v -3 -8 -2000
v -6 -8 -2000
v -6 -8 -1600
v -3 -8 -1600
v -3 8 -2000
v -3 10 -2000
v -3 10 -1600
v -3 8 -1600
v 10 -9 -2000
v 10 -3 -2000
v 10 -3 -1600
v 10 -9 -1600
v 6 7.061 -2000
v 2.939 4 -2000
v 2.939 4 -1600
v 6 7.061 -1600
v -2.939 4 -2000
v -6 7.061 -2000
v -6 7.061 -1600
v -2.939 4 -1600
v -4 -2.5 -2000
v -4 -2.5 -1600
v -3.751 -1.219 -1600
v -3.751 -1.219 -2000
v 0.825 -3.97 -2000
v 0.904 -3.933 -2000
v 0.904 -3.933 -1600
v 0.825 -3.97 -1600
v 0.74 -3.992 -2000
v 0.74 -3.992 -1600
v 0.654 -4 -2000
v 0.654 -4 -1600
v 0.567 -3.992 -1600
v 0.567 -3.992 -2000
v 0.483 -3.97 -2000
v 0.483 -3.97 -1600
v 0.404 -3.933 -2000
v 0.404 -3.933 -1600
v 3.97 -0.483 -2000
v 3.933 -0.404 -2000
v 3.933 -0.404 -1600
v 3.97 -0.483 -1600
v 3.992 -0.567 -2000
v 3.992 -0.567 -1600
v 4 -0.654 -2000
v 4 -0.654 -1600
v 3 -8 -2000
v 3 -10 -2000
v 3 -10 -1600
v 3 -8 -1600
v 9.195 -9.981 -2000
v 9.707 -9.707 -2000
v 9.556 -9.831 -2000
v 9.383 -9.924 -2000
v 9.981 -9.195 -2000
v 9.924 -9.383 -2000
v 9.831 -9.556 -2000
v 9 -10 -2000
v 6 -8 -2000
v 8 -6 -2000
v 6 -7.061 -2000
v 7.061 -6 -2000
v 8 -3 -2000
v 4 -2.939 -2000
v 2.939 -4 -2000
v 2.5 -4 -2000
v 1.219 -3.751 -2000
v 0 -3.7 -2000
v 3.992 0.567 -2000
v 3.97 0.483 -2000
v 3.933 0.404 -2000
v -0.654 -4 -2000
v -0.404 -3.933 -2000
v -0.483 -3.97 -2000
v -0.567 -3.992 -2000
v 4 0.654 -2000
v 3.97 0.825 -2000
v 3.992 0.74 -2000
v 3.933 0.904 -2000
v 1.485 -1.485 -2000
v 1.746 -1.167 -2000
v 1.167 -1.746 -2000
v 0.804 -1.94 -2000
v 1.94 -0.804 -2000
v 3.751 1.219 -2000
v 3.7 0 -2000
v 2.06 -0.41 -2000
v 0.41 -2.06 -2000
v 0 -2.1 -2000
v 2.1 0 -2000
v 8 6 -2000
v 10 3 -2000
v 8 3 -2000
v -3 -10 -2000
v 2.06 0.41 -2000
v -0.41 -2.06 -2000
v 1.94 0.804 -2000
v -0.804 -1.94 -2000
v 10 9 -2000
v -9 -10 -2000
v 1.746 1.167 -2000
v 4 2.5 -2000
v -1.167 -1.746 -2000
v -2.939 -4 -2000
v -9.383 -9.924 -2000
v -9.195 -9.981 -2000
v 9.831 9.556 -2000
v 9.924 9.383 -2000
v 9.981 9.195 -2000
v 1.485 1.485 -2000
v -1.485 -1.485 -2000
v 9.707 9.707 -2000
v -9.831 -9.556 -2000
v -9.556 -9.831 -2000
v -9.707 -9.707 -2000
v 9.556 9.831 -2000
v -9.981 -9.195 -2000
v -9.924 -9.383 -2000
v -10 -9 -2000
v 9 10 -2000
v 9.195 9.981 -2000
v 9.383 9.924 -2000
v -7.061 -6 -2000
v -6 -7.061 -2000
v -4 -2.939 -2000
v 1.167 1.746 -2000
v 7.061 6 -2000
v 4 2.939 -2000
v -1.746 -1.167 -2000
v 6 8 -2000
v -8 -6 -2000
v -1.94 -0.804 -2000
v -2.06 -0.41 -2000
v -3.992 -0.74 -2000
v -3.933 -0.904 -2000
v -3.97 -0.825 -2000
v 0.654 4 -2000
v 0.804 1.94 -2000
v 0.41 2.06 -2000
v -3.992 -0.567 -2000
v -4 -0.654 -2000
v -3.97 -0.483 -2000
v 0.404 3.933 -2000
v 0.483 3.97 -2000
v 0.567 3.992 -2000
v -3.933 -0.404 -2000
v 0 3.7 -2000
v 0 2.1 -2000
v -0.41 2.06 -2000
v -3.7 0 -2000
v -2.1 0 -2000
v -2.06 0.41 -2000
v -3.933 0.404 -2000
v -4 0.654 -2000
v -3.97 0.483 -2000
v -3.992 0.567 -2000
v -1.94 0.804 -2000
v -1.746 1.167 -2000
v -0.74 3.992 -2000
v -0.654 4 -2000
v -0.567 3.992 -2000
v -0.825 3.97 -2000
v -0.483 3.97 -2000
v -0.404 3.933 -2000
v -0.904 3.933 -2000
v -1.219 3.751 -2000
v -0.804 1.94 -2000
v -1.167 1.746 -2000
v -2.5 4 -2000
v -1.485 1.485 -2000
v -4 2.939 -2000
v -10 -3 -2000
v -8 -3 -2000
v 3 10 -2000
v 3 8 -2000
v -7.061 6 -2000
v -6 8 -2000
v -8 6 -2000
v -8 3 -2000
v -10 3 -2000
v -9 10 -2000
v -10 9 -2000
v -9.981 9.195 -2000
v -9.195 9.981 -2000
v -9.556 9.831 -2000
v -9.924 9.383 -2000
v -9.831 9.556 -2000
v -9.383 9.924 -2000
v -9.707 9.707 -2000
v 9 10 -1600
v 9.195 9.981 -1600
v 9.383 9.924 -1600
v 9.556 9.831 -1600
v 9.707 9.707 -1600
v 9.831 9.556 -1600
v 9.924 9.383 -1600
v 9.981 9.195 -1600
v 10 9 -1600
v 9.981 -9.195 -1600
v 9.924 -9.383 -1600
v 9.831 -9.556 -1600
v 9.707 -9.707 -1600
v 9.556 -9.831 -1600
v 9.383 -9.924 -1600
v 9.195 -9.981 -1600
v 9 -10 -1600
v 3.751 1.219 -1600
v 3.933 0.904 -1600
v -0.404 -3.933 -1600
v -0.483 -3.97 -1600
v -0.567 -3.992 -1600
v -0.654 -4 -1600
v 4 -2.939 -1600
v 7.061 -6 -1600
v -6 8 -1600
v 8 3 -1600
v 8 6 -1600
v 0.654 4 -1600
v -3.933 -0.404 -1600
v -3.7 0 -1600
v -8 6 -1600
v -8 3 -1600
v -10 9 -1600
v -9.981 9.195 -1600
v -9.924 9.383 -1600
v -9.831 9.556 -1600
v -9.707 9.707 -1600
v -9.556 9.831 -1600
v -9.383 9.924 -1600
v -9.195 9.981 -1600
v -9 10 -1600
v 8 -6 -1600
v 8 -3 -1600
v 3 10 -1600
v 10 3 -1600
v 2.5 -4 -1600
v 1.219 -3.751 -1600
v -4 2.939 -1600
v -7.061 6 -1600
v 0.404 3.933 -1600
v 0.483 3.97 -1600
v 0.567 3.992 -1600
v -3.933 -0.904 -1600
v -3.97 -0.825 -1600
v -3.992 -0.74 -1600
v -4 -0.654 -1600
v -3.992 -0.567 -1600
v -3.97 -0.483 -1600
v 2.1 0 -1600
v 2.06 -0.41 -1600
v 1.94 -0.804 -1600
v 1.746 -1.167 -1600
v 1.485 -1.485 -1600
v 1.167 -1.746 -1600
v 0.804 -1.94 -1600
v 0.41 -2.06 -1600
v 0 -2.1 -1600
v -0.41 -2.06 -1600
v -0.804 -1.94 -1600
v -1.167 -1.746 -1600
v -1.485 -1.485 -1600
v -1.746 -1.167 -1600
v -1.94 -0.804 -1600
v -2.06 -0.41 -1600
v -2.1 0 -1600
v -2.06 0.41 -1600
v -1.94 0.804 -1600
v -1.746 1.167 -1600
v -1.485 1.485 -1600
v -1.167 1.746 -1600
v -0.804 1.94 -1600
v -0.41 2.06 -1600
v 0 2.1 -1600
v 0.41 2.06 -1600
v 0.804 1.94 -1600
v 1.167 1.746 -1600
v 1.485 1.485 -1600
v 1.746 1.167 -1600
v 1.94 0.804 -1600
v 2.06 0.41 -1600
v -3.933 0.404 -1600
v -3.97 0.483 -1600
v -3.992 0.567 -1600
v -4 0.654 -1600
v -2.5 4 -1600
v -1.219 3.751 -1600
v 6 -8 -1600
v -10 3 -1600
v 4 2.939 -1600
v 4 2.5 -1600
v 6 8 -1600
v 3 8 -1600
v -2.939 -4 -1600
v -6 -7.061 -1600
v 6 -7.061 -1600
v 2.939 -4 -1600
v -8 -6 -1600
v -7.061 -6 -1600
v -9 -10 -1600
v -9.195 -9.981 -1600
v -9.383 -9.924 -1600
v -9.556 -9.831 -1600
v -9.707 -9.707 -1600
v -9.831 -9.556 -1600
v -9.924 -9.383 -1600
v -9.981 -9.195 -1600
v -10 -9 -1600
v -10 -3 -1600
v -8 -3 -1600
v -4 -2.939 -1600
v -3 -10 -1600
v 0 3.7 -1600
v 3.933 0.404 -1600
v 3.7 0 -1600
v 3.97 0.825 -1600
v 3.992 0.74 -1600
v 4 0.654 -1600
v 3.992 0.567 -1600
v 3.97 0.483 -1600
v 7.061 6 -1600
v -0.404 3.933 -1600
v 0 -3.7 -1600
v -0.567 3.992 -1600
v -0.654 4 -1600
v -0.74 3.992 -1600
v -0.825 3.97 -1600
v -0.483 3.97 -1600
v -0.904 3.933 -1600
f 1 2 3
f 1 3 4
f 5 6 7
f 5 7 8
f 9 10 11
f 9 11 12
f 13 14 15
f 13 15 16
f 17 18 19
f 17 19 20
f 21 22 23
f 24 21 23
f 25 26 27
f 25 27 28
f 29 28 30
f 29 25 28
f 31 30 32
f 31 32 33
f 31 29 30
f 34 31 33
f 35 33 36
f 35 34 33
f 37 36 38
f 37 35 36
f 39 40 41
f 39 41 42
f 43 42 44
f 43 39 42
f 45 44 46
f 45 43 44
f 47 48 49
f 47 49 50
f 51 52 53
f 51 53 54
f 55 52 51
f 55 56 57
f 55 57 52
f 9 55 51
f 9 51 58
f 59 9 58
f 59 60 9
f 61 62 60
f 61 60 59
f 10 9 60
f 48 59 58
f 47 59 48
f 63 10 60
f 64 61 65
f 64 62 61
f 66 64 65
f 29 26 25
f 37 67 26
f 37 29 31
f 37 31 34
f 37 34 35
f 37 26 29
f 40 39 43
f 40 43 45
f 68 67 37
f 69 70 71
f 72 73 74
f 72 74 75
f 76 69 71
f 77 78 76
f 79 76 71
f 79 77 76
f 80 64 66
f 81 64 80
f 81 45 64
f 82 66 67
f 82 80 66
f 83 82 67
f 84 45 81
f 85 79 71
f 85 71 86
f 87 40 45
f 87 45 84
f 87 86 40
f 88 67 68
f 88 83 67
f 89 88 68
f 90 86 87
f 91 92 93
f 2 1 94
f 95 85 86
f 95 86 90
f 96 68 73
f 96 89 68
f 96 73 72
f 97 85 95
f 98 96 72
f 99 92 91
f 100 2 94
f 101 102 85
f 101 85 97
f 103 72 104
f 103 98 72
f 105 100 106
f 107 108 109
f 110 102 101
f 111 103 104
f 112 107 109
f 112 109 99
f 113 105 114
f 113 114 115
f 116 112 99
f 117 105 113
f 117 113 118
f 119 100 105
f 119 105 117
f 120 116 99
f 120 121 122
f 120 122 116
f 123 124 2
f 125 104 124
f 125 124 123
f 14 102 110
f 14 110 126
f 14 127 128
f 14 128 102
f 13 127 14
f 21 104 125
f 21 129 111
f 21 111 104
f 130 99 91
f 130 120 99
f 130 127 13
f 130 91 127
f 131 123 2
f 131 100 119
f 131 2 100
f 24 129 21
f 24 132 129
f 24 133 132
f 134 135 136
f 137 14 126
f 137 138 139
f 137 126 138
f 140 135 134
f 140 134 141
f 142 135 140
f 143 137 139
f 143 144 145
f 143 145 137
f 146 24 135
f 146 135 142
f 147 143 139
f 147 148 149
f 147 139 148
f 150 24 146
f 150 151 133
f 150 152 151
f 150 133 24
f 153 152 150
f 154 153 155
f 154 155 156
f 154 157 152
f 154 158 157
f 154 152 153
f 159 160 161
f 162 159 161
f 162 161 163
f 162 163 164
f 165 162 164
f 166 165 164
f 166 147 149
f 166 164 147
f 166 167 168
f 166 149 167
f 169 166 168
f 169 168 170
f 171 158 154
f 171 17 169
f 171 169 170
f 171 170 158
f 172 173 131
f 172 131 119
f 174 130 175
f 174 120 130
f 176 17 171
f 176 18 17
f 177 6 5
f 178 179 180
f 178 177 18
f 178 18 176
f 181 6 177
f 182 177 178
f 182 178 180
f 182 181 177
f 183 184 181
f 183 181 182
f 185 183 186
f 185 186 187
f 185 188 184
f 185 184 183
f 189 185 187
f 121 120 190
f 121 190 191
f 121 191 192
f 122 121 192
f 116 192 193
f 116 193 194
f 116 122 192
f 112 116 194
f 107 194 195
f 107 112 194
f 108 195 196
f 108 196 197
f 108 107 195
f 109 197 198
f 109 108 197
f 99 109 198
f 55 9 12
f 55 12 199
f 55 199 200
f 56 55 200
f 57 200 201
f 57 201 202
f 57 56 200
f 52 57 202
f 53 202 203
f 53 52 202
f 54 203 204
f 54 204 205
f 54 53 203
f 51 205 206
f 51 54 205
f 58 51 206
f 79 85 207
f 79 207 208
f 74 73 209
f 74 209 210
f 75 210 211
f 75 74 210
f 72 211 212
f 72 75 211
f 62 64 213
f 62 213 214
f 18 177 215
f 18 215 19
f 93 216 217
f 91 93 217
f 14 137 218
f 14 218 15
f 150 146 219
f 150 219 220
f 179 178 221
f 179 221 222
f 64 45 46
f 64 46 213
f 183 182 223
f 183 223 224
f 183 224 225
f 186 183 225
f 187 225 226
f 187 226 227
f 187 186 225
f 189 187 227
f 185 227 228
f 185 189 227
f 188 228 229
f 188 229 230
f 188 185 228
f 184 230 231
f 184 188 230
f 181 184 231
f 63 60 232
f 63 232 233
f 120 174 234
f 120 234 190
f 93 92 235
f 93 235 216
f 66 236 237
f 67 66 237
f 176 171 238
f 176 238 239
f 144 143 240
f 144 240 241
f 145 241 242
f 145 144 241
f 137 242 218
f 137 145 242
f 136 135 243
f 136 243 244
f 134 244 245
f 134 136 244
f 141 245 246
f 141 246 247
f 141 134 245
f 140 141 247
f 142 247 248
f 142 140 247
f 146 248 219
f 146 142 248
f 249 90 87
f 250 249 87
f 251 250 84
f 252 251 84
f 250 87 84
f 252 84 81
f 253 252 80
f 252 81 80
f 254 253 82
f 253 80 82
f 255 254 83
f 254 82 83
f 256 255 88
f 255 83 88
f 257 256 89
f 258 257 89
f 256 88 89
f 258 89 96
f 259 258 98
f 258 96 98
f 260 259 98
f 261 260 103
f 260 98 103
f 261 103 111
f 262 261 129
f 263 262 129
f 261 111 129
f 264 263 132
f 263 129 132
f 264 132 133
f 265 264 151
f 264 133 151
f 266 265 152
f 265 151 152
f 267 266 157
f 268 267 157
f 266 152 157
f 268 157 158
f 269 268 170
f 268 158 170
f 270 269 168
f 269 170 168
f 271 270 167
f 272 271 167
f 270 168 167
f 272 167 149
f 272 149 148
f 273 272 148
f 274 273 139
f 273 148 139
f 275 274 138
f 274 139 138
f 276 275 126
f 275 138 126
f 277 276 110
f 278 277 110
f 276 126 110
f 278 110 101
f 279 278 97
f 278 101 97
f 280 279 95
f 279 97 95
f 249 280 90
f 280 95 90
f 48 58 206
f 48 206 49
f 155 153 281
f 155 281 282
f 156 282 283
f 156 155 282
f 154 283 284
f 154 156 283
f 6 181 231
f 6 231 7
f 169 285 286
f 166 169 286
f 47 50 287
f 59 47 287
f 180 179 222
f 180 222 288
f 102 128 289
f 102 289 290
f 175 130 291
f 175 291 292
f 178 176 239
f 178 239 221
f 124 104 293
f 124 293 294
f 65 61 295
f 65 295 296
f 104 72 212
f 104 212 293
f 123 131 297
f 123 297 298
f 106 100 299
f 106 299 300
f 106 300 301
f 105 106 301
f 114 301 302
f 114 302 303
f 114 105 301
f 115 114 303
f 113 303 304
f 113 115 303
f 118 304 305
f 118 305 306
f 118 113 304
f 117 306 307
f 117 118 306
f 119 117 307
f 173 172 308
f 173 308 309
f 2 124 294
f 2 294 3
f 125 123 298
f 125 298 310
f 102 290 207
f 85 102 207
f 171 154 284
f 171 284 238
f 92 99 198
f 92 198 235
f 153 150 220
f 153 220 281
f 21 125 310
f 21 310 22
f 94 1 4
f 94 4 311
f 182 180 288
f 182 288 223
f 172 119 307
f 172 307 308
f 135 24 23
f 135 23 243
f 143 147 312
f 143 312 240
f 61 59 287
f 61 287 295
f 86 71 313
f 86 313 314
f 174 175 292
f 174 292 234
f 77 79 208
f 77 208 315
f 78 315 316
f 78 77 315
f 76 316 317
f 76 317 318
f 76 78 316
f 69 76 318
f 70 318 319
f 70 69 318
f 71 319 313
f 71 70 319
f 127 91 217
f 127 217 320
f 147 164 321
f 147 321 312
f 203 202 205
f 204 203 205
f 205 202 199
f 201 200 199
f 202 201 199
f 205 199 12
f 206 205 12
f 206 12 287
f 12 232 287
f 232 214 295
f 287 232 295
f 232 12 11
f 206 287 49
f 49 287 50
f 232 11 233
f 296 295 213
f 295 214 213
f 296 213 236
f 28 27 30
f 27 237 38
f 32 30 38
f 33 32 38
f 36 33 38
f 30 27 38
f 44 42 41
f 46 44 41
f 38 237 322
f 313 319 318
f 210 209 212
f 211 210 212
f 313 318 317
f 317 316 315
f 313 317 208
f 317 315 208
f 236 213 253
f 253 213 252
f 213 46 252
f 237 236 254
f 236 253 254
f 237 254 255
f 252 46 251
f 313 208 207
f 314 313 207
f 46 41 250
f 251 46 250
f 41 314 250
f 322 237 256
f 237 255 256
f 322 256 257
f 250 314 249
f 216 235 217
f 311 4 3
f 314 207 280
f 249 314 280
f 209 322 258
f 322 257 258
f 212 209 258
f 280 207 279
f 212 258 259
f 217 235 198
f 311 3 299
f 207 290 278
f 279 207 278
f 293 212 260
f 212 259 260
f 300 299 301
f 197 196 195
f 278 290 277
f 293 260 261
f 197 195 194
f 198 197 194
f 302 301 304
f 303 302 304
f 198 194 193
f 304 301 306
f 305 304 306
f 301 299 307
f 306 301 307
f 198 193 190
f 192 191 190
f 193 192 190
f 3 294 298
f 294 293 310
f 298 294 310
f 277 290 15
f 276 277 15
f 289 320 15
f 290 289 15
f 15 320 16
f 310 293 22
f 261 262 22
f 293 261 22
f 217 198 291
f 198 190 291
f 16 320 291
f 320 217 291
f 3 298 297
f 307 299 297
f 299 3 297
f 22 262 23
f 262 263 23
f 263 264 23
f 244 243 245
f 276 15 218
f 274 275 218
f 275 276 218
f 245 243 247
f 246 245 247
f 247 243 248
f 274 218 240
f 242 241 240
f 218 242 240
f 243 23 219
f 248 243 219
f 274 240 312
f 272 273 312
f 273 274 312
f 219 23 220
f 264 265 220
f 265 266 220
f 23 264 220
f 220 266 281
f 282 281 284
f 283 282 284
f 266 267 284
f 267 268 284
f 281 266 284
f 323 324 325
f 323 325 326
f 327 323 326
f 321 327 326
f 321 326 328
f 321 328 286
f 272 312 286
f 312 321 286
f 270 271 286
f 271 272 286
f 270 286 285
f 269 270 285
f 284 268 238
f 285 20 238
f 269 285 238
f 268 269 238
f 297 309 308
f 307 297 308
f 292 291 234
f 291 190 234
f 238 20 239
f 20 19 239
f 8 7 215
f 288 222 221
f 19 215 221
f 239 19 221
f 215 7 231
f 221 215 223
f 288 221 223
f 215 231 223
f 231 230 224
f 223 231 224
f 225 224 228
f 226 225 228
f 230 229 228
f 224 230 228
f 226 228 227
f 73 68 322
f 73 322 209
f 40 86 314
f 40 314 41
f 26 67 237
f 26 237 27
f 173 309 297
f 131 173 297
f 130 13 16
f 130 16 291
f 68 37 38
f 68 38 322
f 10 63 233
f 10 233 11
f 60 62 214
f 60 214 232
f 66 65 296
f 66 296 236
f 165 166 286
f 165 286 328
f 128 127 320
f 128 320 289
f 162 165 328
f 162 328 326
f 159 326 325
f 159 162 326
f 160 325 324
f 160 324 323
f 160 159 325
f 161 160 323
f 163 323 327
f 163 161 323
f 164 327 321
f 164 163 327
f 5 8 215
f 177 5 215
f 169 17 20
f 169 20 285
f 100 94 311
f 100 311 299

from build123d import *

# Parameters (mm, degrees)
SKETCH1_R           = 2.1
BOSS_EXTRUDE1_DEPTH = 400


with BuildPart() as part:
    # Sketch1 → Boss-Extrude1 (new body)
    with BuildSketch(Plane(origin=(0, 0, -2000), x_dir=(-1, 0, 0), z_dir=(0, 0, -1))):
        with BuildLine():
            Line((10, -3), (8, -3))
            Line((8, -3), (8, -6))
            Line((8, -6), (7.060660172, -6))
            Line((7.060660172, -6), (4, -2.939339828))
            Line((4, -2.939339828), (4, -2.5))
            Line((4, -2.5), (3.750976592, -1.218885629))
            Line((3.750976592, -1.218885629), (3.933012702, -0.903589838))
            ThreePointArc((3.933012702, -0.903589838), (4, -0.653589838), (3.933012702, -0.403589838))
            Line((3.933012702, -0.403589838), (3.7, 0))
            Line((3.7, 0), (3.933012702, 0.403589838))
            ThreePointArc((3.933012702, 0.403589838), (3.982962913, 0.524180316), (4, 0.653589838))
            Line((4, 0.653589838), (4, 2.939339828))
            Line((4, 2.939339828), (7.060660172, 6))
            Line((7.060660172, 6), (8, 6))
            Line((8, 6), (8, 3))
            Line((8, 3), (10, 3))
            Line((10, 3), (10, 9))
            ThreePointArc((10, 9), (9.707106781, 9.707106781), (9, 10))
            Line((9, 10), (3, 10))
            Line((3, 10), (3, 8))
            Line((3, 8), (6, 8))
            Line((6, 8), (6, 7.060660172))
            Line((6, 7.060660172), (2.939339828, 4))
            Line((2.939339828, 4), (2.5, 4))
            Line((2.5, 4), (1.218885629, 3.750976592))
            Line((1.218885629, 3.750976592), (0.903589838, 3.933012702))
            ThreePointArc((0.903589838, 3.933012702), (0.653589838, 4), (0.403589838, 3.933012702))
            Line((0.403589838, 3.933012702), (0, 3.7))
            Line((0, 3.7), (-0.403589838, 3.933012702))
            ThreePointArc((-0.403589838, 3.933012702), (-0.524180316, 3.982962913), (-0.653589838, 4))
            Line((-0.653589838, 4), (-2.939339828, 4))
            Line((-2.939339828, 4), (-6, 7.060660172))
            Line((-6, 7.060660172), (-6, 8))
            Line((-6, 8), (-3, 8))
            Line((-3, 8), (-3, 10))
            Line((-3, 10), (-9, 10))
            ThreePointArc((-9, 10), (-9.707106781, 9.707106781), (-10, 9))
            Line((-10, 9), (-10, 3))
            Line((-10, 3), (-8, 3))
            Line((-8, 3), (-8, 6))
            Line((-8, 6), (-7.060660172, 6))
            Line((-7.060660172, 6), (-4, 2.939339828))
            Line((-4, 2.939339828), (-4, 2.5))
            Line((-4, 2.5), (-3.750976592, 1.218885629))
            Line((-3.750976592, 1.218885629), (-3.933012702, 0.903589838))
            ThreePointArc((-3.933012702, 0.903589838), (-4, 0.653589838), (-3.933012702, 0.403589838))
            Line((-3.933012702, 0.403589838), (-3.7, 0))
            Line((-3.7, 0), (-3.933012702, -0.403589838))
            ThreePointArc((-3.933012702, -0.403589838), (-3.982962913, -0.524180316), (-4, -0.653589838))
            Line((-4, -0.653589838), (-4, -2.939339828))
            Line((-4, -2.939339828), (-7.060660172, -6))
            Line((-7.060660172, -6), (-8, -6))
            Line((-8, -6), (-8, -3))
            Line((-8, -3), (-10, -3))
            Line((-10, -3), (-10, -9))
            ThreePointArc((-10, -9), (-9.707106781, -9.707106781), (-9, -10))
            Line((-9, -10), (-3, -10))
            Line((-3, -10), (-3, -8))
            Line((-3, -8), (-6, -8))
            Line((-6, -8), (-6, -7.060660172))
            Line((-6, -7.060660172), (-2.939339828, -4))
            Line((-2.939339828, -4), (-2.5, -4))
            Line((-2.5, -4), (-1.218885629, -3.750976592))
            Line((-1.218885629, -3.750976592), (-0.903589838, -3.933012702))
            ThreePointArc((-0.903589838, -3.933012702), (-0.653589838, -4), (-0.403589838, -3.933012702))
            Line((-0.403589838, -3.933012702), (0, -3.7))
            Line((0, -3.7), (0.403589838, -3.933012702))
            ThreePointArc((0.403589838, -3.933012702), (0.524180316, -3.982962913), (0.653589838, -4))
            Line((0.653589838, -4), (2.939339828, -4))
            Line((2.939339828, -4), (6, -7.060660172))
            Line((6, -7.060660172), (6, -8))
            Line((6, -8), (3, -8))
            Line((3, -8), (3, -10))
            Line((3, -10), (9, -10))
            ThreePointArc((9, -10), (9.707106781, -9.707106781), (10, -9))
            Line((10, -9), (10, -3))
        make_face()
        with Locations(Location((0, 0, 0), (0, 0, 180))):
            Circle(SKETCH1_R, mode=Mode.SUBTRACT)
    extrude(amount=-BOSS_EXTRUDE1_DEPTH)


solid = part.part
